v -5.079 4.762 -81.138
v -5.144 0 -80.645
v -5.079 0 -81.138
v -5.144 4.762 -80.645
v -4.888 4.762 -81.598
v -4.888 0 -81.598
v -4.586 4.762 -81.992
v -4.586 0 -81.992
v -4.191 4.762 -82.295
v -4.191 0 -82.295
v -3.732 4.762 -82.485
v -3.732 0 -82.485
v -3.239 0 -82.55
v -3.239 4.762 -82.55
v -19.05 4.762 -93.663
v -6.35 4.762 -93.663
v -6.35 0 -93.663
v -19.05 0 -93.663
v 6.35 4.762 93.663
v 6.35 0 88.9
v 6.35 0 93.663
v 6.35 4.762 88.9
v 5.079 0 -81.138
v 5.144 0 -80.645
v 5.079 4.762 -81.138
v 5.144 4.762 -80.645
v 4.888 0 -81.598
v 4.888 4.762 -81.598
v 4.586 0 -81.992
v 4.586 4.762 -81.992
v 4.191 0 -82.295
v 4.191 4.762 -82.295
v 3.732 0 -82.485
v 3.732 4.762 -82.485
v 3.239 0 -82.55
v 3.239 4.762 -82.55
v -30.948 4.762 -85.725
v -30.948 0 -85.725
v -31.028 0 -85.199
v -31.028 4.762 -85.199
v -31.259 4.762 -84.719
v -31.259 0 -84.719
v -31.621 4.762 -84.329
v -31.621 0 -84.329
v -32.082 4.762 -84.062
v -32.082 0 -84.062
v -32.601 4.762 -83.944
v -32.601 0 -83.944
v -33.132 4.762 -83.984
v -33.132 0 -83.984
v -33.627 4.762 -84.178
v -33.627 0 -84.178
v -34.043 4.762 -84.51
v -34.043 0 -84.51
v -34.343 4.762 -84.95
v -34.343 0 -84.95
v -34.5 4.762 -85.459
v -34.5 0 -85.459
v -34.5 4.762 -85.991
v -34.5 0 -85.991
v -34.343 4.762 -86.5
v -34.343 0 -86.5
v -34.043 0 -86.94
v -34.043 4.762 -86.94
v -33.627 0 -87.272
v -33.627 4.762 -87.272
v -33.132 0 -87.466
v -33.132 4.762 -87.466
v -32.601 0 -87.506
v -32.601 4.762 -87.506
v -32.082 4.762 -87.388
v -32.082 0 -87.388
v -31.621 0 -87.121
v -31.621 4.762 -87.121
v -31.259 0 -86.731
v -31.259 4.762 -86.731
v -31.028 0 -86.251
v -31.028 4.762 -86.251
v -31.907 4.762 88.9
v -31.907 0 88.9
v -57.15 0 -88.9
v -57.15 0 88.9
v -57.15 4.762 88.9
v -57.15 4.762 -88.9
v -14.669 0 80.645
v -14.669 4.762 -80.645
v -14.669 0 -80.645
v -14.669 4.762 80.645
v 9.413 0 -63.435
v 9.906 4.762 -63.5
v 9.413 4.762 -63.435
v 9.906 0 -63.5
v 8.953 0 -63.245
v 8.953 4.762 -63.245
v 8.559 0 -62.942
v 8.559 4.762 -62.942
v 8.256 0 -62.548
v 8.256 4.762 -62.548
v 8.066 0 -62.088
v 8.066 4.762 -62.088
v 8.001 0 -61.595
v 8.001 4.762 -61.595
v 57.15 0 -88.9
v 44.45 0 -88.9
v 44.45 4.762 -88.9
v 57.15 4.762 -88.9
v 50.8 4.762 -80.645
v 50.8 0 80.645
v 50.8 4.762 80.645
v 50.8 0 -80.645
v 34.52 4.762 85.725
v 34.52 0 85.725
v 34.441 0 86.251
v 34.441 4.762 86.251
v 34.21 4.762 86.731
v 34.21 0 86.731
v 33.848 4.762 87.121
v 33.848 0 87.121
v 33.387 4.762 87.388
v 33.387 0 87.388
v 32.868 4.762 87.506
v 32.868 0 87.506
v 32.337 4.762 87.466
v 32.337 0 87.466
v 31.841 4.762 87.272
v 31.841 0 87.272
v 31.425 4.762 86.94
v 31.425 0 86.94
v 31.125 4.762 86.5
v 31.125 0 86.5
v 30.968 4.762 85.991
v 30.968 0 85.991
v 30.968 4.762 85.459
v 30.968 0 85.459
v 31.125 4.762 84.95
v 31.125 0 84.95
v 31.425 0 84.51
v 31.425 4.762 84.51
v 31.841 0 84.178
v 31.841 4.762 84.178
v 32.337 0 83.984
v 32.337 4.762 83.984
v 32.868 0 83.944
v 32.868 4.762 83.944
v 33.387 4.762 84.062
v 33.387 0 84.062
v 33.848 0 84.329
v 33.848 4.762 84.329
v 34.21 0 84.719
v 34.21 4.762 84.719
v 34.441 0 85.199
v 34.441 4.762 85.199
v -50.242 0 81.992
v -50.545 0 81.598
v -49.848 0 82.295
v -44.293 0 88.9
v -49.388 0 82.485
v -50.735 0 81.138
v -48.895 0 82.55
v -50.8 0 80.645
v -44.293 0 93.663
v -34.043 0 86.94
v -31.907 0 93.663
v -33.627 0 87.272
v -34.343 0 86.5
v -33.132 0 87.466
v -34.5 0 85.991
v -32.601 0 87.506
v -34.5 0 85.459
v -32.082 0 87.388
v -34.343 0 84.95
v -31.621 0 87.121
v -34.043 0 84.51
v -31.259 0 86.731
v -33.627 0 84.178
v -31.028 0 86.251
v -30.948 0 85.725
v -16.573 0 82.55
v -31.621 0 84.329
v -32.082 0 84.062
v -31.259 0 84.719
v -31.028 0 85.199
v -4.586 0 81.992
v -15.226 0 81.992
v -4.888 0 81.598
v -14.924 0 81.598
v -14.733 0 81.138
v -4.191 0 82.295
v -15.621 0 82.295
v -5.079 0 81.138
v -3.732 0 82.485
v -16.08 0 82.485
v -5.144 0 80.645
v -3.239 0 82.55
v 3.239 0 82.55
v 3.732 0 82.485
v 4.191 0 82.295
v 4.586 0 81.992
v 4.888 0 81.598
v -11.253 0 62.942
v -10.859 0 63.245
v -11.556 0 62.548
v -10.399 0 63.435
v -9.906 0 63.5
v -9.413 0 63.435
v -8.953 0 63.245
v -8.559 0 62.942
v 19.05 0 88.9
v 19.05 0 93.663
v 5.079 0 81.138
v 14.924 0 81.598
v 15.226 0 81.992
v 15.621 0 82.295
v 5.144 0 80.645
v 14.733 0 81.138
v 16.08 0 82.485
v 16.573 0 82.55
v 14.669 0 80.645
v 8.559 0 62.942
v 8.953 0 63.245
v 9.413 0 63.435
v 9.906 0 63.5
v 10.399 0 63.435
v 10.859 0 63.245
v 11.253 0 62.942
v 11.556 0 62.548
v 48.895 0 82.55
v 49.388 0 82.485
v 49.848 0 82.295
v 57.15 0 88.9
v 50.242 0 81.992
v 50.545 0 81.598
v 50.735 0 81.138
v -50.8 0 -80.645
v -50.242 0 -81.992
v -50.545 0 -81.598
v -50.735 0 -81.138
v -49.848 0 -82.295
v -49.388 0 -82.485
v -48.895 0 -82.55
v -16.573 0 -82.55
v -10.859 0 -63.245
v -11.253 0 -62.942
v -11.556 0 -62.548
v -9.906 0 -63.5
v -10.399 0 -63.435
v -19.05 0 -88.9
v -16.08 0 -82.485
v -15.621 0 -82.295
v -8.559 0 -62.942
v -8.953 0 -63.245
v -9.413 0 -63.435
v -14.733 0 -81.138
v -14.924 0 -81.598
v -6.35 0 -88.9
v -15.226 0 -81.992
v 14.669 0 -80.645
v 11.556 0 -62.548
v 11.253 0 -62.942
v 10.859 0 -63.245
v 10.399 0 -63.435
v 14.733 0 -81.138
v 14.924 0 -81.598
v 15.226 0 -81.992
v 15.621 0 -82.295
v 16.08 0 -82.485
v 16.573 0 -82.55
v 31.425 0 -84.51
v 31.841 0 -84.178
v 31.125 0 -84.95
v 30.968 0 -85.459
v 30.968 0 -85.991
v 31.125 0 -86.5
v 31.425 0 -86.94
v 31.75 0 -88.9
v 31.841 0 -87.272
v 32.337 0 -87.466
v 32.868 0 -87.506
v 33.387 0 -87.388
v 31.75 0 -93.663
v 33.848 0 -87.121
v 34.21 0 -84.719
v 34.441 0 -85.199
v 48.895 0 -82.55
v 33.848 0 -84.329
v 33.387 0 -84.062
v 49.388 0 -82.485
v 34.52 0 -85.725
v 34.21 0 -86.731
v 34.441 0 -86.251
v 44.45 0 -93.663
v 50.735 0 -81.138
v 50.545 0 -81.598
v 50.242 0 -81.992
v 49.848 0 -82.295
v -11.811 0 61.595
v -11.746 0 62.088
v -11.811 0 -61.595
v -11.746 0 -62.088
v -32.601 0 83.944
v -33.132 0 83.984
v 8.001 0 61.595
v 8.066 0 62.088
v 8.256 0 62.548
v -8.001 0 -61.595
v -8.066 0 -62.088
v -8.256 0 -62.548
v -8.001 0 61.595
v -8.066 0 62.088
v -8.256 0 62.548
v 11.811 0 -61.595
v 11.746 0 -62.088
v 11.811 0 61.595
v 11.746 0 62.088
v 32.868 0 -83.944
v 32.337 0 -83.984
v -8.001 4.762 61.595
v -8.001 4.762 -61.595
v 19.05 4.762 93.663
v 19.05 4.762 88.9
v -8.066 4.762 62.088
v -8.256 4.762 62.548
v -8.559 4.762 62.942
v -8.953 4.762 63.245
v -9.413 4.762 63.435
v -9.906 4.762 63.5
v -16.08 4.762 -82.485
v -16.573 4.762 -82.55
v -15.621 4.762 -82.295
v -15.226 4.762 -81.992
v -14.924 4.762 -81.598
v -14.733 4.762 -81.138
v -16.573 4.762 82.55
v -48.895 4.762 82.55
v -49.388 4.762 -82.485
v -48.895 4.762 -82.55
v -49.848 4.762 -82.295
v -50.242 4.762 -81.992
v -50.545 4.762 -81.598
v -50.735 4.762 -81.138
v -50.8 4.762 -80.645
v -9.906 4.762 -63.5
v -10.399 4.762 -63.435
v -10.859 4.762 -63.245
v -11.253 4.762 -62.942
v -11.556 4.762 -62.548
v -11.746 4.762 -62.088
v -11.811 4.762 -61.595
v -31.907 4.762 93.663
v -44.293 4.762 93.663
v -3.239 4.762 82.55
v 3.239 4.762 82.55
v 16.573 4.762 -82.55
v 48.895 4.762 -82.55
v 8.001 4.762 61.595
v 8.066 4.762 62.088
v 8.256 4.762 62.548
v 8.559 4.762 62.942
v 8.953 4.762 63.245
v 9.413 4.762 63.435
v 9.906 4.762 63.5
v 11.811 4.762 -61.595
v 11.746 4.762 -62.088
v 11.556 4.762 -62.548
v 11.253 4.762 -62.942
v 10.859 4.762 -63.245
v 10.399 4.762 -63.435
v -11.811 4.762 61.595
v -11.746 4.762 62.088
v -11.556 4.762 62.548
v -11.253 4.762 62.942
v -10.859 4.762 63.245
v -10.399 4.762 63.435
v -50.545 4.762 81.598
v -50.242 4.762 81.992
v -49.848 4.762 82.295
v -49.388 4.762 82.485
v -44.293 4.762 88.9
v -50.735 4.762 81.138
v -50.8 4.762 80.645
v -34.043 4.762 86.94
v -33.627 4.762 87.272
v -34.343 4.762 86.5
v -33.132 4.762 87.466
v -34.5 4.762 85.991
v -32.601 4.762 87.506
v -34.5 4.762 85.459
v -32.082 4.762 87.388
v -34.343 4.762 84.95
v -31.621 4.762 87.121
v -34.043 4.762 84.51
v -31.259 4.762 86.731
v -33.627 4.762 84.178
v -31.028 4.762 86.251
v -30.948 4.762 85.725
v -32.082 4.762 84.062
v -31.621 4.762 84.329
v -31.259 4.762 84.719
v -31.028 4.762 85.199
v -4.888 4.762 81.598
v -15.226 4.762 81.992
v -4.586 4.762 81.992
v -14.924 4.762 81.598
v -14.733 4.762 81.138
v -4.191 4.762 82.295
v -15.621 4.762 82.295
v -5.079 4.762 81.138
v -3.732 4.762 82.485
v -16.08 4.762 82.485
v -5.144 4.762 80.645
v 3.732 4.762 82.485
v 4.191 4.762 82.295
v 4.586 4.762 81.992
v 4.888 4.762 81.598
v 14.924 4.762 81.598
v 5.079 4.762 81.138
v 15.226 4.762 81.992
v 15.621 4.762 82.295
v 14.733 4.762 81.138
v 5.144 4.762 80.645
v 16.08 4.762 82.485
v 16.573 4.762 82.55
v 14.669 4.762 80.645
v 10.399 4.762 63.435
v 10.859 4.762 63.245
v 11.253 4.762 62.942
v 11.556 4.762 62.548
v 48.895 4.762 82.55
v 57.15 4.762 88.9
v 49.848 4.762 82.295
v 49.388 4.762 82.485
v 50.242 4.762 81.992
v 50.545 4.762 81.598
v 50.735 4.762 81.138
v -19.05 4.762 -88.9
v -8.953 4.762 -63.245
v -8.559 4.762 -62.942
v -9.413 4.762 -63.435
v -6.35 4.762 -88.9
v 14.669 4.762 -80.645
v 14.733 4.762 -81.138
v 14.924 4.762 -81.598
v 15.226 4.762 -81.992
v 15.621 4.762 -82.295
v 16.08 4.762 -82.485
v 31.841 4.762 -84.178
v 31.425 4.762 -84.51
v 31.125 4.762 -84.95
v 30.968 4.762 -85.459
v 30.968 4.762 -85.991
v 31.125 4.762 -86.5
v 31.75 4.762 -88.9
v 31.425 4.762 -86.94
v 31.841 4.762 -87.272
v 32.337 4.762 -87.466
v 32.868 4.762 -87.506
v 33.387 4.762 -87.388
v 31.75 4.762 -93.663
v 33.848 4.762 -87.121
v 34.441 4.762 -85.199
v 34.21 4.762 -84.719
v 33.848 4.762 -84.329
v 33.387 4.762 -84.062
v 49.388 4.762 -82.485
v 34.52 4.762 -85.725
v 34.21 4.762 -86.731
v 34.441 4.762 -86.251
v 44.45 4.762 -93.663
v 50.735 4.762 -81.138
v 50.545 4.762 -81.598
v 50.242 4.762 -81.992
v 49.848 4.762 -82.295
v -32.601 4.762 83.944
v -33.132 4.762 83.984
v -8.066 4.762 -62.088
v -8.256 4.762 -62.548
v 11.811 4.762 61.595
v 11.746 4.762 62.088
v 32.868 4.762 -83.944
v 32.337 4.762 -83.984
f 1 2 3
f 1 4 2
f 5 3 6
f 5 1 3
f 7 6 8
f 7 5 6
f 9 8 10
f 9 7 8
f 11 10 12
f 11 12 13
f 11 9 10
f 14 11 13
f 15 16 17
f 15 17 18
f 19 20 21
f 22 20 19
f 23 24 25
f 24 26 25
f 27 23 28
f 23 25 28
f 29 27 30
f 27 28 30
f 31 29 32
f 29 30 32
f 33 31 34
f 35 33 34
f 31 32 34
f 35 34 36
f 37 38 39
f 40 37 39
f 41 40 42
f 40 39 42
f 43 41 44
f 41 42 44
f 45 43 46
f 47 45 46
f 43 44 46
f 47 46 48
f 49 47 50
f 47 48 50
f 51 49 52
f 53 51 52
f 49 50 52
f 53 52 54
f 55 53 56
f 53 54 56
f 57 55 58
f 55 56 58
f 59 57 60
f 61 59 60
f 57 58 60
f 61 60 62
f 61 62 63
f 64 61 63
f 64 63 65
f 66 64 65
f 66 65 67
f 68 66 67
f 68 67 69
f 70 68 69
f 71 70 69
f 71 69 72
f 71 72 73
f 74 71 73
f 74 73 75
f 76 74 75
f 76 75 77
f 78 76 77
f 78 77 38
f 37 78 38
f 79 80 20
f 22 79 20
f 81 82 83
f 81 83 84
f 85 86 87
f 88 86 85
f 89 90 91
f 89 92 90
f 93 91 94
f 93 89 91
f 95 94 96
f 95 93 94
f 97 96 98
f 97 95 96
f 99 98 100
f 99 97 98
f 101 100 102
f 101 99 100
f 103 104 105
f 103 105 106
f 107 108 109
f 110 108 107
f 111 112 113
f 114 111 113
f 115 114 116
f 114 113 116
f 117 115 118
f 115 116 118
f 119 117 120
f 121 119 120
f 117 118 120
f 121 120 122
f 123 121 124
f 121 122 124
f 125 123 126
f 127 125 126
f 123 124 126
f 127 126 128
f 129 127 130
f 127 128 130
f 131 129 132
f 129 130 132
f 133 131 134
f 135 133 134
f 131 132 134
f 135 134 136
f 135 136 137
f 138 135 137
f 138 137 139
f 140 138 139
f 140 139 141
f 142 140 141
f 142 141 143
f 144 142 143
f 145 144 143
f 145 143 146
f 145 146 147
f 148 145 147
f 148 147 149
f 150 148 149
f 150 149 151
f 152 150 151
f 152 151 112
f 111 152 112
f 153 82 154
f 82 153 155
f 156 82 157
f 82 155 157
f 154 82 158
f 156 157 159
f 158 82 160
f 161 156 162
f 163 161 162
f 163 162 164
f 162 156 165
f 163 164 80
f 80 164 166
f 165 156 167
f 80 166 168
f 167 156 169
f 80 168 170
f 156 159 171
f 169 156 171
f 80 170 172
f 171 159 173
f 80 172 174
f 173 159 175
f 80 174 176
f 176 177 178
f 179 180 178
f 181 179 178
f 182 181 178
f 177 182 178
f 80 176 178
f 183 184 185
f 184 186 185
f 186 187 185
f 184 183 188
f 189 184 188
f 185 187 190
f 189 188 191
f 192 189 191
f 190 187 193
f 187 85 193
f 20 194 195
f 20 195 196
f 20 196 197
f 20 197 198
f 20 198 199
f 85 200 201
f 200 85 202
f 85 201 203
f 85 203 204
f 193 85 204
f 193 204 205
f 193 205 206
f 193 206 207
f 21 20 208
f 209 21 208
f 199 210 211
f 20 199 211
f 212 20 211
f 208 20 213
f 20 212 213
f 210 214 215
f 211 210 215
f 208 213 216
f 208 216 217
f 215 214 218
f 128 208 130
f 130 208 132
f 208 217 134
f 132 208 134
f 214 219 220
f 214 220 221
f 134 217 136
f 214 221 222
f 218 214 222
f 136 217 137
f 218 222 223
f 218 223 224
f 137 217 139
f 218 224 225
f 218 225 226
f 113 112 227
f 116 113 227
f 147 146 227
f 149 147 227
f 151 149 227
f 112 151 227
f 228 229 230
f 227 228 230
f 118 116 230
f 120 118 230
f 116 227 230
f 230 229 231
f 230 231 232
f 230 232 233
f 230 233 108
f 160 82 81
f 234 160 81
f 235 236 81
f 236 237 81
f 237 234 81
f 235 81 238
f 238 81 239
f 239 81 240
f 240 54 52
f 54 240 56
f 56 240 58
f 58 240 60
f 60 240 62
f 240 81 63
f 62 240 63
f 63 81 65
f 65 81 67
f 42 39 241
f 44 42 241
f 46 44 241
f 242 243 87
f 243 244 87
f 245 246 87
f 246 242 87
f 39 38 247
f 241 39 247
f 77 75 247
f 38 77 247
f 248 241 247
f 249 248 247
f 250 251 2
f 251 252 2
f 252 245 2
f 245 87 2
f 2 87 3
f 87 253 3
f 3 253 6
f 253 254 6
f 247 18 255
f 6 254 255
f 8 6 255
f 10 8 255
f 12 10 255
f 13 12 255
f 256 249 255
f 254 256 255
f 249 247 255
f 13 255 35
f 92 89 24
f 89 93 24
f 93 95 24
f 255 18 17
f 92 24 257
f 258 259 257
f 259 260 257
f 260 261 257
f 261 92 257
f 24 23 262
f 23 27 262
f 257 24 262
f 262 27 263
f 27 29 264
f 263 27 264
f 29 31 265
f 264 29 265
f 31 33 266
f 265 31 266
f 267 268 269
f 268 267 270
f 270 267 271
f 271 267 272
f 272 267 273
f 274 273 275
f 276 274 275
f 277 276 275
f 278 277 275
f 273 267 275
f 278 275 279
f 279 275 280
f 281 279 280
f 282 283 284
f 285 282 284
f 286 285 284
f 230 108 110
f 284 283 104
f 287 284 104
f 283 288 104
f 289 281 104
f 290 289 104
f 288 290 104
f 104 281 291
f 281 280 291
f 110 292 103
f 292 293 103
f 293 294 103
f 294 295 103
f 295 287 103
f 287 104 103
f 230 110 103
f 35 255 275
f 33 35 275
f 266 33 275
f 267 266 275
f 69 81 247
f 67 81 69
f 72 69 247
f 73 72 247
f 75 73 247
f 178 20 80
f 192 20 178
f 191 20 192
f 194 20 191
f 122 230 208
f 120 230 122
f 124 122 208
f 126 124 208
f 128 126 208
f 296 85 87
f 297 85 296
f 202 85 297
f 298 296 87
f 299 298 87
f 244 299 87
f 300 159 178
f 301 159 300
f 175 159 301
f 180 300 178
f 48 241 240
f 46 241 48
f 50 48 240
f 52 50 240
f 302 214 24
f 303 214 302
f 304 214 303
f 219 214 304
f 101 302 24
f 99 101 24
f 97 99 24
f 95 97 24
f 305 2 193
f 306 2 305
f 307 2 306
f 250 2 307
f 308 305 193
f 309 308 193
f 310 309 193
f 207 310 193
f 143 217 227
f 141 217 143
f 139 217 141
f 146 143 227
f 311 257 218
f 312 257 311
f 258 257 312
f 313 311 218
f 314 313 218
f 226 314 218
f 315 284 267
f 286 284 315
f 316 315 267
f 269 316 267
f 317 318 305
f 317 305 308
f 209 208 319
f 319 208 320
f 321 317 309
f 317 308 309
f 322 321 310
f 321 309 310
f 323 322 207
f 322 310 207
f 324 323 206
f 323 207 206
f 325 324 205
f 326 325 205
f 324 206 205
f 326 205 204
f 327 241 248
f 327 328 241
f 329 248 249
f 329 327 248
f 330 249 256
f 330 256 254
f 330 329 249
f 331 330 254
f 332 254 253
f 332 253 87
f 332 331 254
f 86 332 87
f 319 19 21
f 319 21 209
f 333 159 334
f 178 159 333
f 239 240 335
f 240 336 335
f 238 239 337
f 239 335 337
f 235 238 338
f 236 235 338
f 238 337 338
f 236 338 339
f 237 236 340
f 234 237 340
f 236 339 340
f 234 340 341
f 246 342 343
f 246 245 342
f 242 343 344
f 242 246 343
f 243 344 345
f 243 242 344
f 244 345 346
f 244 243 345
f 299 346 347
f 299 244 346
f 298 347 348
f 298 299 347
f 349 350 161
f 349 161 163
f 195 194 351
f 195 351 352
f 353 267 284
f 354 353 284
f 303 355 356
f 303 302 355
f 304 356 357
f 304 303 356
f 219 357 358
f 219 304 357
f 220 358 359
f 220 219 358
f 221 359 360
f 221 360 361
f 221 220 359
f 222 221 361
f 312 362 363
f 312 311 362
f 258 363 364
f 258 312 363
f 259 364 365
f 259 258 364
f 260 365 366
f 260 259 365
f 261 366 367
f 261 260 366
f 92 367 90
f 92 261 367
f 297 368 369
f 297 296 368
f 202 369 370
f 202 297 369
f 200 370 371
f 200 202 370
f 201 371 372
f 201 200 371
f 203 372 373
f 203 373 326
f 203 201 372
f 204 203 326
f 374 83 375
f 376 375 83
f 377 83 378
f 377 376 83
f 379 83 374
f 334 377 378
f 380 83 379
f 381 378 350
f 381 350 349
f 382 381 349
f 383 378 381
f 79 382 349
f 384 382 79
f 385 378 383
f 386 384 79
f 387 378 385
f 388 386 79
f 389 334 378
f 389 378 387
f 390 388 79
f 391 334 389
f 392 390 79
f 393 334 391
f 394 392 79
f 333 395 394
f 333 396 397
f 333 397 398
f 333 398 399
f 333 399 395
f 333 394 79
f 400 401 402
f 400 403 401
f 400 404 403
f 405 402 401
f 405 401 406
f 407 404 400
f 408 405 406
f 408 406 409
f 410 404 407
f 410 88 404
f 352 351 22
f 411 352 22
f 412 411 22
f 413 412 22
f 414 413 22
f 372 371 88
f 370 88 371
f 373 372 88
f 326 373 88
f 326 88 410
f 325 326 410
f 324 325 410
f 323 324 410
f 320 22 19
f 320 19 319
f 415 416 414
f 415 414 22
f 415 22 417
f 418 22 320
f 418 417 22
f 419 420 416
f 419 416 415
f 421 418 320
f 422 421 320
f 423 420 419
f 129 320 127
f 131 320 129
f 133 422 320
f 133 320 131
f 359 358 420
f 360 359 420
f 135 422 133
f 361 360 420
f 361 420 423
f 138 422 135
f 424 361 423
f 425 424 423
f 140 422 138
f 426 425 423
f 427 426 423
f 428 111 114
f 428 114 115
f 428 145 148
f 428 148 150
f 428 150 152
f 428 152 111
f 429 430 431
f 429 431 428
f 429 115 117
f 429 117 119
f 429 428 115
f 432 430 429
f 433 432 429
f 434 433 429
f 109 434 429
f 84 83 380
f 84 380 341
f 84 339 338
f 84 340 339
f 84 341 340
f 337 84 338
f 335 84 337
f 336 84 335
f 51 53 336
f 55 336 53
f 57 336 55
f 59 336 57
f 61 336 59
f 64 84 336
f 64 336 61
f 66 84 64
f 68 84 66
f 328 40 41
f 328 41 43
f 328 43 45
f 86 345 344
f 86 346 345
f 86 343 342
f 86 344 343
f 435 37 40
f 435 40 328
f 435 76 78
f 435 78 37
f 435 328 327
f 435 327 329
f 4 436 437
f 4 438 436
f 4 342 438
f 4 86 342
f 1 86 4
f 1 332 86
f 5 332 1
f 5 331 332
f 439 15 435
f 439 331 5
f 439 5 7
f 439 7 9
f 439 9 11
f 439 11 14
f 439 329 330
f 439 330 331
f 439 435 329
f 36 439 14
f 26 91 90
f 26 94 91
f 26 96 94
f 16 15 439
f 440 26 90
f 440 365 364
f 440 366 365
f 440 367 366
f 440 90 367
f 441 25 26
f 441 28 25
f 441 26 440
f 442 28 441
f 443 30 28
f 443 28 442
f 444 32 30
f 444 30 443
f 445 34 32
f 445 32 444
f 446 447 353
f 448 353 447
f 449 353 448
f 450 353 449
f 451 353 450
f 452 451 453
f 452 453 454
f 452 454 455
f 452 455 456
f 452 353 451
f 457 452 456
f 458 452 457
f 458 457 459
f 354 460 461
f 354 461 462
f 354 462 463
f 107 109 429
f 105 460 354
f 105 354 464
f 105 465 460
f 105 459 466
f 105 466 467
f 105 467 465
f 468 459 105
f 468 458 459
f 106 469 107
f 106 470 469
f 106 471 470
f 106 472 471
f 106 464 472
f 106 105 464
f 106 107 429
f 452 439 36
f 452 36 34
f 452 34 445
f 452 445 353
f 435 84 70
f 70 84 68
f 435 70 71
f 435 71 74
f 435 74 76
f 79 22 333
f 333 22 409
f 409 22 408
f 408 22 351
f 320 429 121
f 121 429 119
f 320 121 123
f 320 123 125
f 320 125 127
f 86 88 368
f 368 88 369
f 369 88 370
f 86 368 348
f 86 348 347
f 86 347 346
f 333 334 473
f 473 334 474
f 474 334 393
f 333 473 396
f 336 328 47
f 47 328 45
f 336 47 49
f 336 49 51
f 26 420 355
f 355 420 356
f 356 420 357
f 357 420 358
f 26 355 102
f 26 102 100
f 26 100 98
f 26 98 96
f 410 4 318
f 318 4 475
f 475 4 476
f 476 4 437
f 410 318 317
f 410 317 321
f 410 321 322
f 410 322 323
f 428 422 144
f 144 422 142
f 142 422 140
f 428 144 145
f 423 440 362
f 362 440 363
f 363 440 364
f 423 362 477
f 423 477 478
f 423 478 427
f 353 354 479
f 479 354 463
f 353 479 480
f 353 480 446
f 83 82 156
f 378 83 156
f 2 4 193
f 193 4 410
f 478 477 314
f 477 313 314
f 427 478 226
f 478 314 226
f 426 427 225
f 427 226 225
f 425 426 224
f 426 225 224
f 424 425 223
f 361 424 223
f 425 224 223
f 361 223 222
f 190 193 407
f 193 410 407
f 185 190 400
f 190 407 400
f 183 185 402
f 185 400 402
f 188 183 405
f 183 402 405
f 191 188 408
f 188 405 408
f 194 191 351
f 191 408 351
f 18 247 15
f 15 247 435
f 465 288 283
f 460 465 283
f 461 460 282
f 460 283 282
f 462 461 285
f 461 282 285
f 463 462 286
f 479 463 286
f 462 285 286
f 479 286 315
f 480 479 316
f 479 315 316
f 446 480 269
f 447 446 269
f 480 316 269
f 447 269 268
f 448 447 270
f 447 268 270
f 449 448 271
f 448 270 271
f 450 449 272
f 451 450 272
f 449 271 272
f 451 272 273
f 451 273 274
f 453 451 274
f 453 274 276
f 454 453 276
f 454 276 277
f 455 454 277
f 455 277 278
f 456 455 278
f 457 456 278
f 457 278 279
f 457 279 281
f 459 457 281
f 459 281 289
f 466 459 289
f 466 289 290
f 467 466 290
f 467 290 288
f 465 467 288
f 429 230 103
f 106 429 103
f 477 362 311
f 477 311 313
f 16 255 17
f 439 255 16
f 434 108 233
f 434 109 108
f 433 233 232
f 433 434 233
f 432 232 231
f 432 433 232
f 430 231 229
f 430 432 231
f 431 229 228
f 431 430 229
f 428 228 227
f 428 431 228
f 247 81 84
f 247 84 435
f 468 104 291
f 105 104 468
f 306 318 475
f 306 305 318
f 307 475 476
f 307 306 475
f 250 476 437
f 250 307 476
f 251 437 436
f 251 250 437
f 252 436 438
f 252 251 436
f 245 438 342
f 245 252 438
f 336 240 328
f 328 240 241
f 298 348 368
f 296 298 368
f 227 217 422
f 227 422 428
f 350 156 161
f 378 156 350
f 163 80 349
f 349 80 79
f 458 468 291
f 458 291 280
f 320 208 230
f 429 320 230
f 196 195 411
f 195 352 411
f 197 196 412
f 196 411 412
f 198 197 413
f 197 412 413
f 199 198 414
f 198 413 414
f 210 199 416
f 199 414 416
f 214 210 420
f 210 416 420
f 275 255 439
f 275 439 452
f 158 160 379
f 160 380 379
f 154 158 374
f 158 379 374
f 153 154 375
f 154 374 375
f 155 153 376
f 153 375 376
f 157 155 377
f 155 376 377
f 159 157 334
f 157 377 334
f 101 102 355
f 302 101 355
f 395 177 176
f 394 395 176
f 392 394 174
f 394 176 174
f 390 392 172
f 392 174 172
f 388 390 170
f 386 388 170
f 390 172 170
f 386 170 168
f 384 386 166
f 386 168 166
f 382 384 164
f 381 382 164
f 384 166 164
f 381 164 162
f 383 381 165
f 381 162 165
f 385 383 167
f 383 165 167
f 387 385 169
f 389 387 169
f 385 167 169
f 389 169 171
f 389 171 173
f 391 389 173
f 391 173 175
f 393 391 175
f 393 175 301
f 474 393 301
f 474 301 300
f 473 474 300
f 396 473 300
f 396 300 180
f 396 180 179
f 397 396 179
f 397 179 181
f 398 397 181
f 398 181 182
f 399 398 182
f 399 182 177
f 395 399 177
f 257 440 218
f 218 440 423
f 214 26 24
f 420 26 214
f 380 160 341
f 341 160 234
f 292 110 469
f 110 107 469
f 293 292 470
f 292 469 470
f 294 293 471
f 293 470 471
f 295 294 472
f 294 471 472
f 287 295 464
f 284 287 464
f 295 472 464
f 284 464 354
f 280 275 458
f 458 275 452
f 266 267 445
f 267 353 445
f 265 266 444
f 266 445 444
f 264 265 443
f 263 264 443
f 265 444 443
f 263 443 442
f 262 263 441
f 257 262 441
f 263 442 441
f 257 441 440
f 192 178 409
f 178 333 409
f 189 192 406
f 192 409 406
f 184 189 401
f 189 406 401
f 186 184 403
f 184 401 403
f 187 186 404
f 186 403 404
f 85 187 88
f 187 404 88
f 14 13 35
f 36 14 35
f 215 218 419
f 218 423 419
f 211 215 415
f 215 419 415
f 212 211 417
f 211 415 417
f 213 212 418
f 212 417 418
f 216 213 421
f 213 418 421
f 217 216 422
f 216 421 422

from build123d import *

# Parameters (mm, degrees)
SKETCH1_W                       = 114.3
SKETCH1_H                       = 177.8
SKETCH1_W_2                     = 101.6
SKETCH1_H_2                     = 165.1
BOSS_EXTRUDE1_DEPTH             = 4.7625
SKETCH2_W                       = 12.38677804
SKETCH2_H                       = 4.7625
SKETCH2_W_2                     = 12.7
BOSS_EXTRUDE2_DEPTH             = 4.7625
SKETCH3_W                       = 12.7
SKETCH3_H                       = 4.7625
BOSS_EXTRUDE3_DEPTH             = 4.7625
SKETCH4_W                       = 9.525
SKETCH4_H                       = 177.8
SKETCH4_W_2                     = 3.81
SKETCH4_H_2                     = 127
BOSS_EXTRUDE4_DEPTH             = 4.7625
FILLET1_R                       = 1.905
F_9_64_0_14063_DIAMETER_HOLE1_D = 3.572002


with BuildPart() as part:
    # Sketch1 → Boss-Extrude1 (new body)
    with BuildSketch(Plane(origin=(0, 0, 0), x_dir=(1, 0, 0), z_dir=(0, 1, 0))):
        Rectangle(SKETCH1_W, SKETCH1_H)
        Rectangle(SKETCH1_W_2, SKETCH1_H_2, mode=Mode.SUBTRACT)
    extrude(amount=BOSS_EXTRUDE1_DEPTH)

    # Sketch2 → Boss-Extrude2 (add)
    with BuildSketch(Plane.XY.offset(88.9)):
        with Locations((-38.1, 2.38125)):
            Rectangle(SKETCH2_W, SKETCH2_H)
        with Locations((12.7, 2.38125)):
            Rectangle(SKETCH2_W_2, SKETCH2_H)
    extrude(amount=BOSS_EXTRUDE2_DEPTH)

    # Sketch3 → Boss-Extrude3 (add)
    with BuildSketch(Plane(origin=(0, 0, -88.9), x_dir=(-1, 0, 0), z_dir=(0, 0, -1))):
        with Locations((-38.1, 2.38125)):
            Rectangle(SKETCH3_W, SKETCH3_H)
        with Locations((12.7, 2.38125)):
            Rectangle(SKETCH3_W, SKETCH3_H)
    extrude(amount=BOSS_EXTRUDE3_DEPTH)

    # Sketch4 → Boss-Extrude4 (add)
    # profile 1 of 2: a face of its own
    with BuildSketch(Plane(origin=(0, 4.7625, 0), x_dir=(-1, 0, 0), z_dir=(0, 1, 0))):
        with Locations((9.906, 0)):
            Rectangle(SKETCH4_W, SKETCH4_H)
        with Locations((9.906, 0)):
            Rectangle(SKETCH4_W_2, SKETCH4_H_2, mode=Mode.SUBTRACT)
    # profile 2 of 2: a face of its own
    with BuildSketch(Plane(origin=(0, 4.7625, 0), x_dir=(-1, 0, 0), z_dir=(0, 1, 0))):
        with Locations((-9.906, 0)):
            Rectangle(SKETCH4_W, SKETCH4_H)
        with Locations((-9.906, 0)):
            Rectangle(SKETCH4_W_2, SKETCH4_H_2, mode=Mode.SUBTRACT)
    extrude(amount=-BOSS_EXTRUDE4_DEPTH)

    # Fillet1
    fillet1_edges = [part.edges().sort_by_distance(p)[0] for p in [
        (-8.001, 2.38125, -63.5),
        (-11.811, 2.38125, -63.5),
        (8.001, 2.38125, -63.5),
        (11.811, 2.38125, -63.5),
        (-8.001, 2.38125, 63.5),
        (-11.811, 2.38125, 63.5),
        (8.001, 2.38125, 63.5),
        (11.811, 2.38125, 63.5),
        (-5.1435, 2.38125, 82.55),
        (5.1435, 2.38125, 82.55),
        (-5.1435, 2.38125, -82.55),
        (5.1435, 2.38125, -82.55),
        (-14.6685, 2.38125, -82.55),
        (-50.8, 2.38125, -82.55),
        (-50.8, 2.38125, 82.55),
        (-14.6685, 2.38125, 82.55),
        (14.6685, 2.38125, 82.55),
        (50.8, 2.38125, 82.55),
        (14.6685, 2.38125, -82.55),
        (50.8, 2.38125, -82.55),
    ]]
    fillet(fillet1_edges, radius=FILLET1_R - 0.0001)  # a hair under: the kernel refuses the full size

    # 9/64 (0.14063) Diameter Hole1 (through all)
    with Locations(Plane(origin=(0, 4.7625, 0), x_dir=(-1, 0, 0), z_dir=(0, 1, 0))):
        with Locations((32.73425, -85.725), (-32.73425, -85.725), (32.73425, 85.725), (-32.73425, 85.725)):
            Hole(F_9_64_0_14063_DIAMETER_HOLE1_D / 2)


solid = part.part
